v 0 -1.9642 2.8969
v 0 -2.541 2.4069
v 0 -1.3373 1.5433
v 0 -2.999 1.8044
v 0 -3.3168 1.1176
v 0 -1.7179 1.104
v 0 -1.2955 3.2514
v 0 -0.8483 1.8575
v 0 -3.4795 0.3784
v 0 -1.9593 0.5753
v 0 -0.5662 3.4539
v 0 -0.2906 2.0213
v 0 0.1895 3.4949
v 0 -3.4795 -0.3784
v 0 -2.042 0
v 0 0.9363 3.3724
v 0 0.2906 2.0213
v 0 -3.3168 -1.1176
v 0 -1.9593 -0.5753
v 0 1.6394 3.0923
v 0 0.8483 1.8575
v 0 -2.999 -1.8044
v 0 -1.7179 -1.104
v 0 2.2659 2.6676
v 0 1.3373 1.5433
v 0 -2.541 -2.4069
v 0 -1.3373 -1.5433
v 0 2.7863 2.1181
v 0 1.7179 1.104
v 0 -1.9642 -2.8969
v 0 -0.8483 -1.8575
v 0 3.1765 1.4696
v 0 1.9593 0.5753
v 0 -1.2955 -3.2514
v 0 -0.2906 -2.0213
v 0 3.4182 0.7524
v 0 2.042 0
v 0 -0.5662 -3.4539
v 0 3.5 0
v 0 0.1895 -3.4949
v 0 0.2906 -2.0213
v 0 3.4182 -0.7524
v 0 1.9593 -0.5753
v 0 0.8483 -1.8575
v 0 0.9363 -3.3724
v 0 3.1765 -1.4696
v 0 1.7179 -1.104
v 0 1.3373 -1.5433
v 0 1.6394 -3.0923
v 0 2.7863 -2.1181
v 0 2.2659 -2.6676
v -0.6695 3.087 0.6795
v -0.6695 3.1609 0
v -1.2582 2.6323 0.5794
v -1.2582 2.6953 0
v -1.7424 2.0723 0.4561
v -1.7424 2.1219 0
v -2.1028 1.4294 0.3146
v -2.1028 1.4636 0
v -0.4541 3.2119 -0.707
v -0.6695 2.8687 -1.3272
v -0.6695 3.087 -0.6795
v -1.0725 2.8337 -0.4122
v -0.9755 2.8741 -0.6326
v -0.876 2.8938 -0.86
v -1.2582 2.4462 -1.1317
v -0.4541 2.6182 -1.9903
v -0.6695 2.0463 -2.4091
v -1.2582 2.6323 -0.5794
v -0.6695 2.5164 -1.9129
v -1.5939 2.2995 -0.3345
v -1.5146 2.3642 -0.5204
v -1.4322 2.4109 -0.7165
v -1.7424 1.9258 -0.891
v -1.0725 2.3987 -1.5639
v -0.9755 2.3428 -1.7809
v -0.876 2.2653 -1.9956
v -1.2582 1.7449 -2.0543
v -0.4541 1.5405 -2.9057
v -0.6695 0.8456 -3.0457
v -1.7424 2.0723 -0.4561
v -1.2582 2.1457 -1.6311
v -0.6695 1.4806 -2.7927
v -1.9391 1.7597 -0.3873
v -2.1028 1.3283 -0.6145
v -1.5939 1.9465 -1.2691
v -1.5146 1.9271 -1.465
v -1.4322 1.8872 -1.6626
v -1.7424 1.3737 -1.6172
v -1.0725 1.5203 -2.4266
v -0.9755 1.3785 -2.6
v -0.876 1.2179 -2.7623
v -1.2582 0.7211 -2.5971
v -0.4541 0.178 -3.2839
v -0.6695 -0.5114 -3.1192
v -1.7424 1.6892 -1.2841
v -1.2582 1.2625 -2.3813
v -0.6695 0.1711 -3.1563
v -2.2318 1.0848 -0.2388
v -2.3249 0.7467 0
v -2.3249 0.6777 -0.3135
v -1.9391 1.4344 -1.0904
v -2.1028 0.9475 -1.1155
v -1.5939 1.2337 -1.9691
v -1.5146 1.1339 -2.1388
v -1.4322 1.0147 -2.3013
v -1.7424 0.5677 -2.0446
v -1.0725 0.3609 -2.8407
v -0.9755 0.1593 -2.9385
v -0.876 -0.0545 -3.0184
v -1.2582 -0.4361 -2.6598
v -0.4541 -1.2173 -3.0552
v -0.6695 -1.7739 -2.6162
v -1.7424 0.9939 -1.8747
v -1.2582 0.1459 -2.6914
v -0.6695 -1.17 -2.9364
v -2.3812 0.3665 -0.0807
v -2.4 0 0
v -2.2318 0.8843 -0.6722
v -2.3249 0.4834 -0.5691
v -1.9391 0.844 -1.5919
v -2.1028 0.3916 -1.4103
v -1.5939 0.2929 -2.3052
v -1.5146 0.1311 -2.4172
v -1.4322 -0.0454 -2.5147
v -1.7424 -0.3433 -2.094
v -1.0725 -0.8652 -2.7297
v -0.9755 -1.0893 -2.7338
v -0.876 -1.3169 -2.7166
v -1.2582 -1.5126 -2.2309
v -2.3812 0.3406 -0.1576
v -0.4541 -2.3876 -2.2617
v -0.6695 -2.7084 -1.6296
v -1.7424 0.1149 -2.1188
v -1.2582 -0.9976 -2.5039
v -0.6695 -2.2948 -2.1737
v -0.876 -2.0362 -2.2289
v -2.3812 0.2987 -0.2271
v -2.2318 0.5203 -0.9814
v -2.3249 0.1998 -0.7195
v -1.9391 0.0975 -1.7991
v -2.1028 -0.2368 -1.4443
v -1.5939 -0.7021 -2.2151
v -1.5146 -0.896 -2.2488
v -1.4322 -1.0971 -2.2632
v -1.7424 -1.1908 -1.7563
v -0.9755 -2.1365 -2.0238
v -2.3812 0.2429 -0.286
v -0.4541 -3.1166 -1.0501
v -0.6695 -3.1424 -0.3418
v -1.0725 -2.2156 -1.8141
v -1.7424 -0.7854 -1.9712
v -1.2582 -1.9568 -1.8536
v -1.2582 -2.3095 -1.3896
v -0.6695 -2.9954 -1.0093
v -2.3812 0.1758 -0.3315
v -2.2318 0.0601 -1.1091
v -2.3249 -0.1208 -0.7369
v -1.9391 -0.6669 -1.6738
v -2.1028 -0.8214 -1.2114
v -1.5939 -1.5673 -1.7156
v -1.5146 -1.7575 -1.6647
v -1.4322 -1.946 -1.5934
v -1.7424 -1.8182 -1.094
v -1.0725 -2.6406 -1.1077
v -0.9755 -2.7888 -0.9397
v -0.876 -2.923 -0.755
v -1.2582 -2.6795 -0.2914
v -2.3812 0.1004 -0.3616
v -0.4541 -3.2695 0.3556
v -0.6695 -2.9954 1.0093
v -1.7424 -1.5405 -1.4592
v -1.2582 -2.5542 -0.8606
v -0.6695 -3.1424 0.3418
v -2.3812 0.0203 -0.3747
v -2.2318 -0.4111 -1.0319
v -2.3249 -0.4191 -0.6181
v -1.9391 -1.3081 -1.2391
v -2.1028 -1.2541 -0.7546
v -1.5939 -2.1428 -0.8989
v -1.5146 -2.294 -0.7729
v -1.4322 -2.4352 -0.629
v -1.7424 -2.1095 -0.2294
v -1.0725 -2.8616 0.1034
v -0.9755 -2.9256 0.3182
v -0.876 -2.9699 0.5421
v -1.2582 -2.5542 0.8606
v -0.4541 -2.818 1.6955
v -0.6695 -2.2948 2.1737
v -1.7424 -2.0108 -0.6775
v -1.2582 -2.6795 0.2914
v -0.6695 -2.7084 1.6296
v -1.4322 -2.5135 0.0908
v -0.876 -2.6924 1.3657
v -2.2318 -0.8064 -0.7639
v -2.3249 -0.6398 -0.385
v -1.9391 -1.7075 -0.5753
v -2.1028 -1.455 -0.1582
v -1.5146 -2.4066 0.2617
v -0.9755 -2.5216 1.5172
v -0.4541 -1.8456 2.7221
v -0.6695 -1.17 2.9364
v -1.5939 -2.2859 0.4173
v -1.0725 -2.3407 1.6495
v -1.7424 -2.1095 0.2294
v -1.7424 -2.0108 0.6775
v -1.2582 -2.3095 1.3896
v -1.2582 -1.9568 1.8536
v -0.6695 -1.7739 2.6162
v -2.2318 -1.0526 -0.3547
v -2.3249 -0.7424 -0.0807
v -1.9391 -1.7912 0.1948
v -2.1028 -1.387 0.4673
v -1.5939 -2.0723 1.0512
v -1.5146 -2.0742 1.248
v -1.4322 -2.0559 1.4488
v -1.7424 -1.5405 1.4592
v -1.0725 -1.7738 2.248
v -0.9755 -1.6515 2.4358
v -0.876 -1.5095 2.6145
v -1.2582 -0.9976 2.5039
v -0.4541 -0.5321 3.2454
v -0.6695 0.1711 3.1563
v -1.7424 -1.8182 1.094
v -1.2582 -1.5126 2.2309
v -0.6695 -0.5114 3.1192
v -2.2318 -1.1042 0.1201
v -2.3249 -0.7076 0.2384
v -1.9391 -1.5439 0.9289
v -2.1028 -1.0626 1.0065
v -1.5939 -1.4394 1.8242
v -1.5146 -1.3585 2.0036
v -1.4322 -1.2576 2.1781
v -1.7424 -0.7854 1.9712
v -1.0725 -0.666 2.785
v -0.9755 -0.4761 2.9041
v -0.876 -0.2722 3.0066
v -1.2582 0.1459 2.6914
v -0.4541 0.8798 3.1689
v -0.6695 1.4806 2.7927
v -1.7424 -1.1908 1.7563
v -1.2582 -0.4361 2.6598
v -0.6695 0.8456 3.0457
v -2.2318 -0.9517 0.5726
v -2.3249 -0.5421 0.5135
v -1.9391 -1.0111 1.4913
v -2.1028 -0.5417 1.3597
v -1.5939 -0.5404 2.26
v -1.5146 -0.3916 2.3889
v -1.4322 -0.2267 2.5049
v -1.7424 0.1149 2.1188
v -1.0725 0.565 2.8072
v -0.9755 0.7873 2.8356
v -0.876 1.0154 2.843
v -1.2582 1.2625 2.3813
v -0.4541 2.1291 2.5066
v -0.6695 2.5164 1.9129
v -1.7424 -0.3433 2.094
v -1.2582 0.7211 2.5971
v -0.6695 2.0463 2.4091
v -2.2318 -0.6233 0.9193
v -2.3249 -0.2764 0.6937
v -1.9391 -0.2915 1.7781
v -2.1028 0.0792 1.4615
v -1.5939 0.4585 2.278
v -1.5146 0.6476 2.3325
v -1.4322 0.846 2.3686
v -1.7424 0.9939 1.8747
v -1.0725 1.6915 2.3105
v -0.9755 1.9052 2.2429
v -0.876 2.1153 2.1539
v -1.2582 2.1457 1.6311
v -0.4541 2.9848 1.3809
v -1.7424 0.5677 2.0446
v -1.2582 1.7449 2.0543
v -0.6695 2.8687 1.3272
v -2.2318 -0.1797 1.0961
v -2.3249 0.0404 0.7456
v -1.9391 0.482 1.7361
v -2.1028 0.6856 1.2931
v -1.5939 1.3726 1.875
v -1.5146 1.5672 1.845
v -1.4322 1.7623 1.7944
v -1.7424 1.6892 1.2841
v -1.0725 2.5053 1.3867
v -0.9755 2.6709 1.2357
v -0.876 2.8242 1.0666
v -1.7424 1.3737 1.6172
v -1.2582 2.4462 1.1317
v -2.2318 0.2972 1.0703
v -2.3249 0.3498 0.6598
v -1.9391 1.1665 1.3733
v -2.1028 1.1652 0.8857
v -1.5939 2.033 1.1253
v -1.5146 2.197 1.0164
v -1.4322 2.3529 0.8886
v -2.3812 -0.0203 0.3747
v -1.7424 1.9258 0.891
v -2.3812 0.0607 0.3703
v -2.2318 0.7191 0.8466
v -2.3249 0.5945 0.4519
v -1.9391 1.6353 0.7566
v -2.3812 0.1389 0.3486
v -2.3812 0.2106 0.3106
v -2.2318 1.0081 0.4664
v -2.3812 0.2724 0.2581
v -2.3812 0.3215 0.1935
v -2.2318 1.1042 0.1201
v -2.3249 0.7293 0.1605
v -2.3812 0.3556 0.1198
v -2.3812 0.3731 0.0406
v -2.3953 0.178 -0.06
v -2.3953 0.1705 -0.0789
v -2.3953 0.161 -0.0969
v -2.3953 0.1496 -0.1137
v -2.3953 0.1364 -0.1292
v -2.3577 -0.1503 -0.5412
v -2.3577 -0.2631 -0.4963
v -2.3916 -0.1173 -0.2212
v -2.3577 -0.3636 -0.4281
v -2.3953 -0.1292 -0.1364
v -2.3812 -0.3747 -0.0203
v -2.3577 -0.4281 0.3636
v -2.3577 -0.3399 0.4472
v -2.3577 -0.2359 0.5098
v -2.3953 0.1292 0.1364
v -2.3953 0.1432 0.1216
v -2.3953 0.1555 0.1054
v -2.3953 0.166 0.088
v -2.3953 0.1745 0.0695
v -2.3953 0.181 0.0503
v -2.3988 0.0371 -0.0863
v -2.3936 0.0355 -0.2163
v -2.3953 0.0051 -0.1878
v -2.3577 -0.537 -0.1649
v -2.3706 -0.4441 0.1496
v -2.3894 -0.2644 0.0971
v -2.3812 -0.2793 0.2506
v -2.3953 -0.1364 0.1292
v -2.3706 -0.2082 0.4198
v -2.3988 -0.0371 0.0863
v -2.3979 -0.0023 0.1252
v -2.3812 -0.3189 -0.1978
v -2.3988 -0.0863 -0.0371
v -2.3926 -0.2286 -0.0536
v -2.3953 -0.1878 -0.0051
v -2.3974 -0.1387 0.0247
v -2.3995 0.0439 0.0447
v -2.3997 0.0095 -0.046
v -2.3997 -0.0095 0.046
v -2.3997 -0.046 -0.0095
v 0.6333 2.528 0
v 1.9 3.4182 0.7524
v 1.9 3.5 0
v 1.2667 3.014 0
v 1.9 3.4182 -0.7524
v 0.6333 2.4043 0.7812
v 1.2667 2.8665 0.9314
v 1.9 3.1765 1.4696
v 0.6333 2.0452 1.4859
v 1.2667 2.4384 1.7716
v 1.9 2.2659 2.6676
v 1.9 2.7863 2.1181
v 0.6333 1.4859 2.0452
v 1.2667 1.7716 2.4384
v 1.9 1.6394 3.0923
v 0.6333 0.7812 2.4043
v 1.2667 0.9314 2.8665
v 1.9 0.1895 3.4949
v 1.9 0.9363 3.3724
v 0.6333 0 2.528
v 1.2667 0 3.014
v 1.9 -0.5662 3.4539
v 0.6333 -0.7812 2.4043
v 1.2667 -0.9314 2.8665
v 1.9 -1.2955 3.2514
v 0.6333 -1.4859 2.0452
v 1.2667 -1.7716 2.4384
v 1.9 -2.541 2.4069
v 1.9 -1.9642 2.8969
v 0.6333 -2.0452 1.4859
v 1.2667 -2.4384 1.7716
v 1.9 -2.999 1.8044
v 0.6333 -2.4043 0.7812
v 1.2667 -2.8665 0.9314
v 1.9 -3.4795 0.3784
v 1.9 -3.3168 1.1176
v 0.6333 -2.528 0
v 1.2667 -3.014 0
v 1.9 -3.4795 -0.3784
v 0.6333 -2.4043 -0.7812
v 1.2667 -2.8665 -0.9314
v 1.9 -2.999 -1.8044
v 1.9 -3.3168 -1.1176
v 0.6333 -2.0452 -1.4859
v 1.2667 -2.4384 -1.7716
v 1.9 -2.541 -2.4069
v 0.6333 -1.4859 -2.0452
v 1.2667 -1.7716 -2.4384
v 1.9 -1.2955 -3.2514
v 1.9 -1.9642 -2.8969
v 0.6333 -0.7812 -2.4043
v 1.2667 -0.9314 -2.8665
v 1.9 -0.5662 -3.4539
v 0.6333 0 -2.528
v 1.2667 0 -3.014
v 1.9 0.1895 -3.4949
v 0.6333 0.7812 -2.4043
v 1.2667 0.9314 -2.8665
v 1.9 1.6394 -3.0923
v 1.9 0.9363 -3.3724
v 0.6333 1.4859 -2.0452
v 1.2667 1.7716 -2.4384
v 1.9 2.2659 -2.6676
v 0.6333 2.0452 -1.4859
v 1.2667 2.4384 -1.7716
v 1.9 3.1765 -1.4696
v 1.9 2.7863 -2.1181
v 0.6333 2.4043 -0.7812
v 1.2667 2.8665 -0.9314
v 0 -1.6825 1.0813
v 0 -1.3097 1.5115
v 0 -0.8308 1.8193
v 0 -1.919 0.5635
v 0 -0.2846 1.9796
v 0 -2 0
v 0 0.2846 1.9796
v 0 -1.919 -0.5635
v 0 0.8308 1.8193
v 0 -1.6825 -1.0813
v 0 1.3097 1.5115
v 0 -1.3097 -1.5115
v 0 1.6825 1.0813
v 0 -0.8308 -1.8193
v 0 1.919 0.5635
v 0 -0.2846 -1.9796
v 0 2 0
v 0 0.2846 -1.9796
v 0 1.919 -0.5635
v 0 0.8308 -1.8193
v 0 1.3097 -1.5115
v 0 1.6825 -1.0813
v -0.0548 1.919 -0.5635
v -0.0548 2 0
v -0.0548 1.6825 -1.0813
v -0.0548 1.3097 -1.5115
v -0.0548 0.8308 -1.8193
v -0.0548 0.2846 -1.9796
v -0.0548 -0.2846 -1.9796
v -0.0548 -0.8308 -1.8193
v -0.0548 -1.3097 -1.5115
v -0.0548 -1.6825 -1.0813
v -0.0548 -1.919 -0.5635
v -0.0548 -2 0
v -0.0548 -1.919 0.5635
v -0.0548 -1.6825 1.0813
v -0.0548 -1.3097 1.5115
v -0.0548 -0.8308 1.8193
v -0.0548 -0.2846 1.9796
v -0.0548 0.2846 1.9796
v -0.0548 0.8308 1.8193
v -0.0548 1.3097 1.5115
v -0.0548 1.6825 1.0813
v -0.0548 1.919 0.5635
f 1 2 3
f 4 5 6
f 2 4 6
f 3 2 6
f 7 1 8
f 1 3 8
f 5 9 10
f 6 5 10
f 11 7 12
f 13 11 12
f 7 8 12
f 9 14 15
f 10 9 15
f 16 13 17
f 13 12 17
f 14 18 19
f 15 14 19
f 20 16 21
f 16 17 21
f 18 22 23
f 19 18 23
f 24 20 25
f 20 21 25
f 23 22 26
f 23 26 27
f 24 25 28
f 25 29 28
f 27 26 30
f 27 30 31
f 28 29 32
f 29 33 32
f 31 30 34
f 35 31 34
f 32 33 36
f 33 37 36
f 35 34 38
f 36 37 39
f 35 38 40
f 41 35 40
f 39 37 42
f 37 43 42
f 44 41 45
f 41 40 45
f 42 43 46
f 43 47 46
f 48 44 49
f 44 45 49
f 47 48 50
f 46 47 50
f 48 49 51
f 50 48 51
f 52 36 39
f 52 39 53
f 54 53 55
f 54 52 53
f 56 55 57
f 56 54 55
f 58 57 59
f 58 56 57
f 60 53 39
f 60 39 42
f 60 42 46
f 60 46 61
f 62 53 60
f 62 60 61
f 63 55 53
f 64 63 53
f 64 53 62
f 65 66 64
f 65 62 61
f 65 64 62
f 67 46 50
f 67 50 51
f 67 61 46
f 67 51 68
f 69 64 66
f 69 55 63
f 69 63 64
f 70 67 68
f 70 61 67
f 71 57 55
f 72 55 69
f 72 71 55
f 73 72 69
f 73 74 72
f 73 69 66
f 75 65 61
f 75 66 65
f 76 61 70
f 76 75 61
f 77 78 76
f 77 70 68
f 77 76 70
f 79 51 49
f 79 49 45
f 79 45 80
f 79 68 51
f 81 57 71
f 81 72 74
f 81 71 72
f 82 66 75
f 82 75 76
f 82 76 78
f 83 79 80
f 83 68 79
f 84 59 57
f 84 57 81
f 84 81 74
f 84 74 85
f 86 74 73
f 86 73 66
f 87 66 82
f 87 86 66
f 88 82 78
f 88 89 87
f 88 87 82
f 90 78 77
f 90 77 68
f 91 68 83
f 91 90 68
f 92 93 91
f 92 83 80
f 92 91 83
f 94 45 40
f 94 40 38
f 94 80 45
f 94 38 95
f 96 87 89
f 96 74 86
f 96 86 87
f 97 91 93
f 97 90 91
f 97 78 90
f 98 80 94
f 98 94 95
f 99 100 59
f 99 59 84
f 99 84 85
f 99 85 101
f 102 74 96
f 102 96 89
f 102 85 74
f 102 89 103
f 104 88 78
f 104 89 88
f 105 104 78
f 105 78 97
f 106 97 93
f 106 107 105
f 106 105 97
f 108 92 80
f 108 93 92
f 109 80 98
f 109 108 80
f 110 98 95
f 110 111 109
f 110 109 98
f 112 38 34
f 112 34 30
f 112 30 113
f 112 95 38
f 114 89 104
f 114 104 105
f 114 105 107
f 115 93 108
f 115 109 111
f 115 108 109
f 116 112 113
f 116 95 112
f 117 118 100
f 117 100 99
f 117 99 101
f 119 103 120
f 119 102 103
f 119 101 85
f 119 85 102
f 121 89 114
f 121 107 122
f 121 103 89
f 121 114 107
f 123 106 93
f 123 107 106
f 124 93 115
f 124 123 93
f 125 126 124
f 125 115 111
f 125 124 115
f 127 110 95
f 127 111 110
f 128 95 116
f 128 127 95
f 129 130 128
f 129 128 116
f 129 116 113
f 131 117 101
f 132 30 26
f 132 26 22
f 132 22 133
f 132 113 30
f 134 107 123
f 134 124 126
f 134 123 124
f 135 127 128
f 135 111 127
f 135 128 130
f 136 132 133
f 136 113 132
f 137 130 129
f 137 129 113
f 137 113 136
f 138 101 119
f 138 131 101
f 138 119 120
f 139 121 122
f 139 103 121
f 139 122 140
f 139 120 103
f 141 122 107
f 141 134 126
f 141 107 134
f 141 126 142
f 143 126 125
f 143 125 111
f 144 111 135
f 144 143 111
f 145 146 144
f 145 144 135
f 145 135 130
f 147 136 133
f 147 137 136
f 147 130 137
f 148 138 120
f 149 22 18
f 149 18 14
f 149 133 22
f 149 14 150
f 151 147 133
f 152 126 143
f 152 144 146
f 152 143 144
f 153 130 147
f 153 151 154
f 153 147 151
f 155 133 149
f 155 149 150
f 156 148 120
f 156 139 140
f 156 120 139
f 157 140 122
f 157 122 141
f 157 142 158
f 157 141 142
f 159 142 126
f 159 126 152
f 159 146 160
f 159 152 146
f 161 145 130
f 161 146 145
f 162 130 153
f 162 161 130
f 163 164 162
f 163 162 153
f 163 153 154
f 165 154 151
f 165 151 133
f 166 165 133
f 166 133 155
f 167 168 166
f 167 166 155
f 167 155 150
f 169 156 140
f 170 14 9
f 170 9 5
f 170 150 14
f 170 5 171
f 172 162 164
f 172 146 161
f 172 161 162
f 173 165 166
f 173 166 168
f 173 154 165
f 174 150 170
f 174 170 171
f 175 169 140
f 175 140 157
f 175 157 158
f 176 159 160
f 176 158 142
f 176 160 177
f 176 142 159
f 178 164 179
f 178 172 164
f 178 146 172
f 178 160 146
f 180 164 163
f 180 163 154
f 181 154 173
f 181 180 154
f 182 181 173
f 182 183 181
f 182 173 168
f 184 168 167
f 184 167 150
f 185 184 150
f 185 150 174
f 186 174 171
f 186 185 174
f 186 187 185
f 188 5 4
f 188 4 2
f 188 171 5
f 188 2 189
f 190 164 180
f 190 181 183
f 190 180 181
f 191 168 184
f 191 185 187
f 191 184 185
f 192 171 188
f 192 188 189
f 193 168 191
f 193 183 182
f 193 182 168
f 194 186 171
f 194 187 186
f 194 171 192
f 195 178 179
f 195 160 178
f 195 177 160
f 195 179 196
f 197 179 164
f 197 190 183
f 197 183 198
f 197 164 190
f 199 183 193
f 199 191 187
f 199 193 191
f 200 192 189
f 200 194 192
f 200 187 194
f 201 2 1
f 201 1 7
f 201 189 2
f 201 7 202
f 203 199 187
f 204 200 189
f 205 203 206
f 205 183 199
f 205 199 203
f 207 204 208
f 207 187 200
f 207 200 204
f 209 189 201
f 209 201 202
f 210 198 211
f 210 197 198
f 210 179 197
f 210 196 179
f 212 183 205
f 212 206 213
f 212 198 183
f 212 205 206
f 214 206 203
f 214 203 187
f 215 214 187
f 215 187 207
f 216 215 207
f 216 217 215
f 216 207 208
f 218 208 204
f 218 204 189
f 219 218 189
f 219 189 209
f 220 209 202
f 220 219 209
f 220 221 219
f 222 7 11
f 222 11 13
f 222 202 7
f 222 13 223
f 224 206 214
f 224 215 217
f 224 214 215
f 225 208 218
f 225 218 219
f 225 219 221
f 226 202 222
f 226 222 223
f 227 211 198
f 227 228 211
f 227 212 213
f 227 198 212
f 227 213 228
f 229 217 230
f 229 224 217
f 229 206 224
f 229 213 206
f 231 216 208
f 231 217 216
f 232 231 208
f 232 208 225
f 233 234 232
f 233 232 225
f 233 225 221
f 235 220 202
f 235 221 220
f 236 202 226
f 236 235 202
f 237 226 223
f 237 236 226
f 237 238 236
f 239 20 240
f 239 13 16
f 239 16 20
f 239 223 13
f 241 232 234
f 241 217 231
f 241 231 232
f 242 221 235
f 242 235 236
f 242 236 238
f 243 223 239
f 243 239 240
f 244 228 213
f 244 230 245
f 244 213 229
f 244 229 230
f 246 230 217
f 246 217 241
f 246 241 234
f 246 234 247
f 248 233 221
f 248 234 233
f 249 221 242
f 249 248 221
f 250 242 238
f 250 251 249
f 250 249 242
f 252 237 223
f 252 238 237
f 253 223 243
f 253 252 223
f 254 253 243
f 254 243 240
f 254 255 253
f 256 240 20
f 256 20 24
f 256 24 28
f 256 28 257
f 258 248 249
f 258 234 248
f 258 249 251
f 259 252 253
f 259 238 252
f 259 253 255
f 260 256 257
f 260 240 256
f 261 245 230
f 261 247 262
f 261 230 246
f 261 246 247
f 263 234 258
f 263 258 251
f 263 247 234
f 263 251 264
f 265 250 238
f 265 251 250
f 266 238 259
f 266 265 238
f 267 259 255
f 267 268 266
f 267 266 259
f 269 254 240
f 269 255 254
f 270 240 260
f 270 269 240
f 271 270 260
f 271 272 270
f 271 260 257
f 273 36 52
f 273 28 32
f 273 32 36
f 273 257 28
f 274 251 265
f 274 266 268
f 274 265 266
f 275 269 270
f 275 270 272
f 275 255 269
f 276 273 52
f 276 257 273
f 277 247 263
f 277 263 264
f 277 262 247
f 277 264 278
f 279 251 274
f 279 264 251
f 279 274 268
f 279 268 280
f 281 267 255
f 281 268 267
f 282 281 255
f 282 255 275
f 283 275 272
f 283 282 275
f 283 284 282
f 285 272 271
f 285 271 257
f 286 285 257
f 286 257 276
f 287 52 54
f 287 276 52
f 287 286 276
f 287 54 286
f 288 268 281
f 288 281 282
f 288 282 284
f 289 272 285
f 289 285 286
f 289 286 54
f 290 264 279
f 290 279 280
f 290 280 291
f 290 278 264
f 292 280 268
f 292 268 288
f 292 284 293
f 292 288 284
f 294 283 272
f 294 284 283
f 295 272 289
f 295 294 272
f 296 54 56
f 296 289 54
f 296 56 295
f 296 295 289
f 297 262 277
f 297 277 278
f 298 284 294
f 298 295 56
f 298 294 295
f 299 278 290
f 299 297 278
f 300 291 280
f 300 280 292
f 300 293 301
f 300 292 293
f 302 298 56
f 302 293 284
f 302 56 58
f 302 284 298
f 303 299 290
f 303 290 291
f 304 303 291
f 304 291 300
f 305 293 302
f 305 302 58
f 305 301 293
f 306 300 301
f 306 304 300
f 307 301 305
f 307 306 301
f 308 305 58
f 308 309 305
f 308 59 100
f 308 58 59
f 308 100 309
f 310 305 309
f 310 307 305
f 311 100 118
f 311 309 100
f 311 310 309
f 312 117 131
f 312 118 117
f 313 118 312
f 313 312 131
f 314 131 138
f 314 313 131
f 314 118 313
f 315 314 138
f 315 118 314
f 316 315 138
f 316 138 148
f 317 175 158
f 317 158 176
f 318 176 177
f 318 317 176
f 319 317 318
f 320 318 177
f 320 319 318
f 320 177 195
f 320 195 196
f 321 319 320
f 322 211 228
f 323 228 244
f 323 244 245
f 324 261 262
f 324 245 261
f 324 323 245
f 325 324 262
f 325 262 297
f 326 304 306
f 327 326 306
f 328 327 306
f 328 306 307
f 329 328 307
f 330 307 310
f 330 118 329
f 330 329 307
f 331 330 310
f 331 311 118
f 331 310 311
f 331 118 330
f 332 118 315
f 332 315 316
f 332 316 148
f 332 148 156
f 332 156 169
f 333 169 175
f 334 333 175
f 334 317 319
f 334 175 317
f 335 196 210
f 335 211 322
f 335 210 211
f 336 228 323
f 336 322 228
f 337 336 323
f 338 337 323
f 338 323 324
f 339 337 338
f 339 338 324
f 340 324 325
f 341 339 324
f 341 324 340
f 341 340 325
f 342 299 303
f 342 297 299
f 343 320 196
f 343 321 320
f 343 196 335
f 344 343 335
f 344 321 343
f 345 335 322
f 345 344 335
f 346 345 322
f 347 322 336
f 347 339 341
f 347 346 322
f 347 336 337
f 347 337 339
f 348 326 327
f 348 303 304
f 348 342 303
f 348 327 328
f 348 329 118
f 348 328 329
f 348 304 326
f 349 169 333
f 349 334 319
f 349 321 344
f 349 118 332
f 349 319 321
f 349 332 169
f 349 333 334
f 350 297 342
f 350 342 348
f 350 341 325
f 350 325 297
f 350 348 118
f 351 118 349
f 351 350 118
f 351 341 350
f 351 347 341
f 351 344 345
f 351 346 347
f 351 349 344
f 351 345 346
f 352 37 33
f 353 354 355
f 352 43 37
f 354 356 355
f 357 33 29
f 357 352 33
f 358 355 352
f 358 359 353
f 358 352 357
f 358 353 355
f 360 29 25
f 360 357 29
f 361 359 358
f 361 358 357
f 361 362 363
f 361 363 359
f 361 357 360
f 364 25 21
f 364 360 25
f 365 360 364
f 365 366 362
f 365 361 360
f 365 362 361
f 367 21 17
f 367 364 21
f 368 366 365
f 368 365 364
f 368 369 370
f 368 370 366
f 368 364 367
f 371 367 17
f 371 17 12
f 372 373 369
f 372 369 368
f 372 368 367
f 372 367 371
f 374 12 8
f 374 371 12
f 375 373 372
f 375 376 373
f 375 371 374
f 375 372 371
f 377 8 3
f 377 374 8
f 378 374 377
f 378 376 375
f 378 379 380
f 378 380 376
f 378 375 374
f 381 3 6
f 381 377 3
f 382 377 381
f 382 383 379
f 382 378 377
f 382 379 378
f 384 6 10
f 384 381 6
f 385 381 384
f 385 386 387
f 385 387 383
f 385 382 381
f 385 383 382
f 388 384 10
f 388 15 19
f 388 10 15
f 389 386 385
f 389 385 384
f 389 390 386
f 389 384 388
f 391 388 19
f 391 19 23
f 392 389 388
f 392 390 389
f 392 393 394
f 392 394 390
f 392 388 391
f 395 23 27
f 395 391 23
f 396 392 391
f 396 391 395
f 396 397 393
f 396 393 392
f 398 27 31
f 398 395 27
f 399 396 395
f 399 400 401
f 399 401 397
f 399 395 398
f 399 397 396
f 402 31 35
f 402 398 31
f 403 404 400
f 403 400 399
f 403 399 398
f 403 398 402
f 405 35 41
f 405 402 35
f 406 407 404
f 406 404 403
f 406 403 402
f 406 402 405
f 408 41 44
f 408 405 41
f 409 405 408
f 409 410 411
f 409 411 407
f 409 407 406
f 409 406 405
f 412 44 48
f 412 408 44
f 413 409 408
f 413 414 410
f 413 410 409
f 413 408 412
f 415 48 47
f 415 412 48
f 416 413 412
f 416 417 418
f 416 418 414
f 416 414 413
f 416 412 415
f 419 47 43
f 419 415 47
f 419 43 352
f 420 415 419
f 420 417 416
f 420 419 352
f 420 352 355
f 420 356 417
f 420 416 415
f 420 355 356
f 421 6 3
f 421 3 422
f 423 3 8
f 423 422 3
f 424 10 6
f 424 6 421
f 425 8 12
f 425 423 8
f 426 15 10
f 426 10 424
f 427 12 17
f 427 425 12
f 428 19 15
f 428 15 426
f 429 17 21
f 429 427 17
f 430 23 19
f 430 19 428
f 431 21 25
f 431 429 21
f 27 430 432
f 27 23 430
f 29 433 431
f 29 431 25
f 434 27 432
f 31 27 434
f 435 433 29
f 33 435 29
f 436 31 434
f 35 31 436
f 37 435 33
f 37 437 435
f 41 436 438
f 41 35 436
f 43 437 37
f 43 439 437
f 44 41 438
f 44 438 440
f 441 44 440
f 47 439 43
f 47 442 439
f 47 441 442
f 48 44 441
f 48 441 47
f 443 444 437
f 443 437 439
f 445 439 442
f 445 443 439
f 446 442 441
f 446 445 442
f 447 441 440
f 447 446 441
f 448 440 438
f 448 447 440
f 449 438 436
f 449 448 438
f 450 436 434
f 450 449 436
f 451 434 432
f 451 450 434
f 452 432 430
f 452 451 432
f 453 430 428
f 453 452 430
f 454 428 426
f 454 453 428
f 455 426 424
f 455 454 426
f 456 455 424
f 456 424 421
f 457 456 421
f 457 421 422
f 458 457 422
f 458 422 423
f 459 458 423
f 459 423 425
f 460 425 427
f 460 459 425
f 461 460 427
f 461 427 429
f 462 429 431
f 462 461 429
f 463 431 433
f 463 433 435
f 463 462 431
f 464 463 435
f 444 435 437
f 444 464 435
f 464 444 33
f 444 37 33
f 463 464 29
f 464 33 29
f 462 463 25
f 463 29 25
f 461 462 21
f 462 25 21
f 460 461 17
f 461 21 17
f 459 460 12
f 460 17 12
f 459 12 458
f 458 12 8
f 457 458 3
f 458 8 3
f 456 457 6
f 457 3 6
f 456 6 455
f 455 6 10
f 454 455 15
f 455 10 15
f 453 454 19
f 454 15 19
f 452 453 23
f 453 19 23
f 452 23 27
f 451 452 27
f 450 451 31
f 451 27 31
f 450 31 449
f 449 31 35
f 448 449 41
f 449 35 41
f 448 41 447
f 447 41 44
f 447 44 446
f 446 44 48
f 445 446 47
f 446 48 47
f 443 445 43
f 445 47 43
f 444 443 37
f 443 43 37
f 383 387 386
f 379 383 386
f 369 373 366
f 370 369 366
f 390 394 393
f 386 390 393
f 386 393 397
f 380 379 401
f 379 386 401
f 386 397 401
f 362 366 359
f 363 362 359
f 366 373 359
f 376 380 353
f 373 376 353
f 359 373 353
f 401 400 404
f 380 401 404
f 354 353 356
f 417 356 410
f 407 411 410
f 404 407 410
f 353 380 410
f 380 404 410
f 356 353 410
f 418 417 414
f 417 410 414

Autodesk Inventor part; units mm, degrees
ref_plane "YZ Plane" through (0, 0, 0) normal (1, 0, 0) x (0, 1, 0)
ref_plane "XZ Plane" through (0, 0, 0) normal (0, 1, 0) x (-1, 0, 0)
ref_plane "XY Plane" through (0, 0, 0) normal (0, 0, 1) x (1, 0, 0)
sketch "Эскиз" plane through (0, 0, 0) normal (0, 0, 1) x (1, 0, 0)
  line L0 (0, 2) -> (-0.0548, 2)
  line L1 (-0.0548, 2) -> (1.9, 3.5)
  line L2 (1.9, 3.5) -> (1.9, 0)
  line L3 (1.9, 0) -> (-2.4, 0)
  line L4 (0, 2) -> (0, 3.5)
  arc A0 (0, 3.5) -> (-2.4, 0) centre (1.3521, 0) ccw
  line L5 (-1.0835, 0) -> (1.3472, 0) projected
  line L6 (0, -0.1982) -> (0, 1.189) projected
  dimension "d0" = 2.4
  dimension "d1" = 7
  dimension "d2" = 4
  dimension "d4" = 37.5
  dimension "d6" = 1.9
  dimension "d14" = 7
revolve "Базовый элемент" add sketch "Эскиз" angle 360 about axis through (1.9, 0, 0) along (-1, 0, 0)
equation "\"d0\" = KOH"
equation "\"d1\" = KOD"
equation "\"d2\" = NND1"
equation "\"d4\" = 0.5 * SEWI1"
equation "\"d6\" = KLG"
equation "\"d14\" = KOD"
equation "\"KLG\" = 1.9"
equation "\"NND1\" = 4"
equation "\"KOD1\" = KOD"
equation "\"KOH1\" = 1.9"
equation "\"SEWI1\" = 75deg"
equation "\"KOH\" = 2.4"
equation "\"KOD\" = 7"
equation "\"NLG\" = 8"
equation "\"NND\" = 4"
equation "\"KLGMAX\" = 5"
equation "\"KLGMIN\" = 1.8"
properties part number "DIN 660 - B 4 x 8" material "Сталь, мягкая"
